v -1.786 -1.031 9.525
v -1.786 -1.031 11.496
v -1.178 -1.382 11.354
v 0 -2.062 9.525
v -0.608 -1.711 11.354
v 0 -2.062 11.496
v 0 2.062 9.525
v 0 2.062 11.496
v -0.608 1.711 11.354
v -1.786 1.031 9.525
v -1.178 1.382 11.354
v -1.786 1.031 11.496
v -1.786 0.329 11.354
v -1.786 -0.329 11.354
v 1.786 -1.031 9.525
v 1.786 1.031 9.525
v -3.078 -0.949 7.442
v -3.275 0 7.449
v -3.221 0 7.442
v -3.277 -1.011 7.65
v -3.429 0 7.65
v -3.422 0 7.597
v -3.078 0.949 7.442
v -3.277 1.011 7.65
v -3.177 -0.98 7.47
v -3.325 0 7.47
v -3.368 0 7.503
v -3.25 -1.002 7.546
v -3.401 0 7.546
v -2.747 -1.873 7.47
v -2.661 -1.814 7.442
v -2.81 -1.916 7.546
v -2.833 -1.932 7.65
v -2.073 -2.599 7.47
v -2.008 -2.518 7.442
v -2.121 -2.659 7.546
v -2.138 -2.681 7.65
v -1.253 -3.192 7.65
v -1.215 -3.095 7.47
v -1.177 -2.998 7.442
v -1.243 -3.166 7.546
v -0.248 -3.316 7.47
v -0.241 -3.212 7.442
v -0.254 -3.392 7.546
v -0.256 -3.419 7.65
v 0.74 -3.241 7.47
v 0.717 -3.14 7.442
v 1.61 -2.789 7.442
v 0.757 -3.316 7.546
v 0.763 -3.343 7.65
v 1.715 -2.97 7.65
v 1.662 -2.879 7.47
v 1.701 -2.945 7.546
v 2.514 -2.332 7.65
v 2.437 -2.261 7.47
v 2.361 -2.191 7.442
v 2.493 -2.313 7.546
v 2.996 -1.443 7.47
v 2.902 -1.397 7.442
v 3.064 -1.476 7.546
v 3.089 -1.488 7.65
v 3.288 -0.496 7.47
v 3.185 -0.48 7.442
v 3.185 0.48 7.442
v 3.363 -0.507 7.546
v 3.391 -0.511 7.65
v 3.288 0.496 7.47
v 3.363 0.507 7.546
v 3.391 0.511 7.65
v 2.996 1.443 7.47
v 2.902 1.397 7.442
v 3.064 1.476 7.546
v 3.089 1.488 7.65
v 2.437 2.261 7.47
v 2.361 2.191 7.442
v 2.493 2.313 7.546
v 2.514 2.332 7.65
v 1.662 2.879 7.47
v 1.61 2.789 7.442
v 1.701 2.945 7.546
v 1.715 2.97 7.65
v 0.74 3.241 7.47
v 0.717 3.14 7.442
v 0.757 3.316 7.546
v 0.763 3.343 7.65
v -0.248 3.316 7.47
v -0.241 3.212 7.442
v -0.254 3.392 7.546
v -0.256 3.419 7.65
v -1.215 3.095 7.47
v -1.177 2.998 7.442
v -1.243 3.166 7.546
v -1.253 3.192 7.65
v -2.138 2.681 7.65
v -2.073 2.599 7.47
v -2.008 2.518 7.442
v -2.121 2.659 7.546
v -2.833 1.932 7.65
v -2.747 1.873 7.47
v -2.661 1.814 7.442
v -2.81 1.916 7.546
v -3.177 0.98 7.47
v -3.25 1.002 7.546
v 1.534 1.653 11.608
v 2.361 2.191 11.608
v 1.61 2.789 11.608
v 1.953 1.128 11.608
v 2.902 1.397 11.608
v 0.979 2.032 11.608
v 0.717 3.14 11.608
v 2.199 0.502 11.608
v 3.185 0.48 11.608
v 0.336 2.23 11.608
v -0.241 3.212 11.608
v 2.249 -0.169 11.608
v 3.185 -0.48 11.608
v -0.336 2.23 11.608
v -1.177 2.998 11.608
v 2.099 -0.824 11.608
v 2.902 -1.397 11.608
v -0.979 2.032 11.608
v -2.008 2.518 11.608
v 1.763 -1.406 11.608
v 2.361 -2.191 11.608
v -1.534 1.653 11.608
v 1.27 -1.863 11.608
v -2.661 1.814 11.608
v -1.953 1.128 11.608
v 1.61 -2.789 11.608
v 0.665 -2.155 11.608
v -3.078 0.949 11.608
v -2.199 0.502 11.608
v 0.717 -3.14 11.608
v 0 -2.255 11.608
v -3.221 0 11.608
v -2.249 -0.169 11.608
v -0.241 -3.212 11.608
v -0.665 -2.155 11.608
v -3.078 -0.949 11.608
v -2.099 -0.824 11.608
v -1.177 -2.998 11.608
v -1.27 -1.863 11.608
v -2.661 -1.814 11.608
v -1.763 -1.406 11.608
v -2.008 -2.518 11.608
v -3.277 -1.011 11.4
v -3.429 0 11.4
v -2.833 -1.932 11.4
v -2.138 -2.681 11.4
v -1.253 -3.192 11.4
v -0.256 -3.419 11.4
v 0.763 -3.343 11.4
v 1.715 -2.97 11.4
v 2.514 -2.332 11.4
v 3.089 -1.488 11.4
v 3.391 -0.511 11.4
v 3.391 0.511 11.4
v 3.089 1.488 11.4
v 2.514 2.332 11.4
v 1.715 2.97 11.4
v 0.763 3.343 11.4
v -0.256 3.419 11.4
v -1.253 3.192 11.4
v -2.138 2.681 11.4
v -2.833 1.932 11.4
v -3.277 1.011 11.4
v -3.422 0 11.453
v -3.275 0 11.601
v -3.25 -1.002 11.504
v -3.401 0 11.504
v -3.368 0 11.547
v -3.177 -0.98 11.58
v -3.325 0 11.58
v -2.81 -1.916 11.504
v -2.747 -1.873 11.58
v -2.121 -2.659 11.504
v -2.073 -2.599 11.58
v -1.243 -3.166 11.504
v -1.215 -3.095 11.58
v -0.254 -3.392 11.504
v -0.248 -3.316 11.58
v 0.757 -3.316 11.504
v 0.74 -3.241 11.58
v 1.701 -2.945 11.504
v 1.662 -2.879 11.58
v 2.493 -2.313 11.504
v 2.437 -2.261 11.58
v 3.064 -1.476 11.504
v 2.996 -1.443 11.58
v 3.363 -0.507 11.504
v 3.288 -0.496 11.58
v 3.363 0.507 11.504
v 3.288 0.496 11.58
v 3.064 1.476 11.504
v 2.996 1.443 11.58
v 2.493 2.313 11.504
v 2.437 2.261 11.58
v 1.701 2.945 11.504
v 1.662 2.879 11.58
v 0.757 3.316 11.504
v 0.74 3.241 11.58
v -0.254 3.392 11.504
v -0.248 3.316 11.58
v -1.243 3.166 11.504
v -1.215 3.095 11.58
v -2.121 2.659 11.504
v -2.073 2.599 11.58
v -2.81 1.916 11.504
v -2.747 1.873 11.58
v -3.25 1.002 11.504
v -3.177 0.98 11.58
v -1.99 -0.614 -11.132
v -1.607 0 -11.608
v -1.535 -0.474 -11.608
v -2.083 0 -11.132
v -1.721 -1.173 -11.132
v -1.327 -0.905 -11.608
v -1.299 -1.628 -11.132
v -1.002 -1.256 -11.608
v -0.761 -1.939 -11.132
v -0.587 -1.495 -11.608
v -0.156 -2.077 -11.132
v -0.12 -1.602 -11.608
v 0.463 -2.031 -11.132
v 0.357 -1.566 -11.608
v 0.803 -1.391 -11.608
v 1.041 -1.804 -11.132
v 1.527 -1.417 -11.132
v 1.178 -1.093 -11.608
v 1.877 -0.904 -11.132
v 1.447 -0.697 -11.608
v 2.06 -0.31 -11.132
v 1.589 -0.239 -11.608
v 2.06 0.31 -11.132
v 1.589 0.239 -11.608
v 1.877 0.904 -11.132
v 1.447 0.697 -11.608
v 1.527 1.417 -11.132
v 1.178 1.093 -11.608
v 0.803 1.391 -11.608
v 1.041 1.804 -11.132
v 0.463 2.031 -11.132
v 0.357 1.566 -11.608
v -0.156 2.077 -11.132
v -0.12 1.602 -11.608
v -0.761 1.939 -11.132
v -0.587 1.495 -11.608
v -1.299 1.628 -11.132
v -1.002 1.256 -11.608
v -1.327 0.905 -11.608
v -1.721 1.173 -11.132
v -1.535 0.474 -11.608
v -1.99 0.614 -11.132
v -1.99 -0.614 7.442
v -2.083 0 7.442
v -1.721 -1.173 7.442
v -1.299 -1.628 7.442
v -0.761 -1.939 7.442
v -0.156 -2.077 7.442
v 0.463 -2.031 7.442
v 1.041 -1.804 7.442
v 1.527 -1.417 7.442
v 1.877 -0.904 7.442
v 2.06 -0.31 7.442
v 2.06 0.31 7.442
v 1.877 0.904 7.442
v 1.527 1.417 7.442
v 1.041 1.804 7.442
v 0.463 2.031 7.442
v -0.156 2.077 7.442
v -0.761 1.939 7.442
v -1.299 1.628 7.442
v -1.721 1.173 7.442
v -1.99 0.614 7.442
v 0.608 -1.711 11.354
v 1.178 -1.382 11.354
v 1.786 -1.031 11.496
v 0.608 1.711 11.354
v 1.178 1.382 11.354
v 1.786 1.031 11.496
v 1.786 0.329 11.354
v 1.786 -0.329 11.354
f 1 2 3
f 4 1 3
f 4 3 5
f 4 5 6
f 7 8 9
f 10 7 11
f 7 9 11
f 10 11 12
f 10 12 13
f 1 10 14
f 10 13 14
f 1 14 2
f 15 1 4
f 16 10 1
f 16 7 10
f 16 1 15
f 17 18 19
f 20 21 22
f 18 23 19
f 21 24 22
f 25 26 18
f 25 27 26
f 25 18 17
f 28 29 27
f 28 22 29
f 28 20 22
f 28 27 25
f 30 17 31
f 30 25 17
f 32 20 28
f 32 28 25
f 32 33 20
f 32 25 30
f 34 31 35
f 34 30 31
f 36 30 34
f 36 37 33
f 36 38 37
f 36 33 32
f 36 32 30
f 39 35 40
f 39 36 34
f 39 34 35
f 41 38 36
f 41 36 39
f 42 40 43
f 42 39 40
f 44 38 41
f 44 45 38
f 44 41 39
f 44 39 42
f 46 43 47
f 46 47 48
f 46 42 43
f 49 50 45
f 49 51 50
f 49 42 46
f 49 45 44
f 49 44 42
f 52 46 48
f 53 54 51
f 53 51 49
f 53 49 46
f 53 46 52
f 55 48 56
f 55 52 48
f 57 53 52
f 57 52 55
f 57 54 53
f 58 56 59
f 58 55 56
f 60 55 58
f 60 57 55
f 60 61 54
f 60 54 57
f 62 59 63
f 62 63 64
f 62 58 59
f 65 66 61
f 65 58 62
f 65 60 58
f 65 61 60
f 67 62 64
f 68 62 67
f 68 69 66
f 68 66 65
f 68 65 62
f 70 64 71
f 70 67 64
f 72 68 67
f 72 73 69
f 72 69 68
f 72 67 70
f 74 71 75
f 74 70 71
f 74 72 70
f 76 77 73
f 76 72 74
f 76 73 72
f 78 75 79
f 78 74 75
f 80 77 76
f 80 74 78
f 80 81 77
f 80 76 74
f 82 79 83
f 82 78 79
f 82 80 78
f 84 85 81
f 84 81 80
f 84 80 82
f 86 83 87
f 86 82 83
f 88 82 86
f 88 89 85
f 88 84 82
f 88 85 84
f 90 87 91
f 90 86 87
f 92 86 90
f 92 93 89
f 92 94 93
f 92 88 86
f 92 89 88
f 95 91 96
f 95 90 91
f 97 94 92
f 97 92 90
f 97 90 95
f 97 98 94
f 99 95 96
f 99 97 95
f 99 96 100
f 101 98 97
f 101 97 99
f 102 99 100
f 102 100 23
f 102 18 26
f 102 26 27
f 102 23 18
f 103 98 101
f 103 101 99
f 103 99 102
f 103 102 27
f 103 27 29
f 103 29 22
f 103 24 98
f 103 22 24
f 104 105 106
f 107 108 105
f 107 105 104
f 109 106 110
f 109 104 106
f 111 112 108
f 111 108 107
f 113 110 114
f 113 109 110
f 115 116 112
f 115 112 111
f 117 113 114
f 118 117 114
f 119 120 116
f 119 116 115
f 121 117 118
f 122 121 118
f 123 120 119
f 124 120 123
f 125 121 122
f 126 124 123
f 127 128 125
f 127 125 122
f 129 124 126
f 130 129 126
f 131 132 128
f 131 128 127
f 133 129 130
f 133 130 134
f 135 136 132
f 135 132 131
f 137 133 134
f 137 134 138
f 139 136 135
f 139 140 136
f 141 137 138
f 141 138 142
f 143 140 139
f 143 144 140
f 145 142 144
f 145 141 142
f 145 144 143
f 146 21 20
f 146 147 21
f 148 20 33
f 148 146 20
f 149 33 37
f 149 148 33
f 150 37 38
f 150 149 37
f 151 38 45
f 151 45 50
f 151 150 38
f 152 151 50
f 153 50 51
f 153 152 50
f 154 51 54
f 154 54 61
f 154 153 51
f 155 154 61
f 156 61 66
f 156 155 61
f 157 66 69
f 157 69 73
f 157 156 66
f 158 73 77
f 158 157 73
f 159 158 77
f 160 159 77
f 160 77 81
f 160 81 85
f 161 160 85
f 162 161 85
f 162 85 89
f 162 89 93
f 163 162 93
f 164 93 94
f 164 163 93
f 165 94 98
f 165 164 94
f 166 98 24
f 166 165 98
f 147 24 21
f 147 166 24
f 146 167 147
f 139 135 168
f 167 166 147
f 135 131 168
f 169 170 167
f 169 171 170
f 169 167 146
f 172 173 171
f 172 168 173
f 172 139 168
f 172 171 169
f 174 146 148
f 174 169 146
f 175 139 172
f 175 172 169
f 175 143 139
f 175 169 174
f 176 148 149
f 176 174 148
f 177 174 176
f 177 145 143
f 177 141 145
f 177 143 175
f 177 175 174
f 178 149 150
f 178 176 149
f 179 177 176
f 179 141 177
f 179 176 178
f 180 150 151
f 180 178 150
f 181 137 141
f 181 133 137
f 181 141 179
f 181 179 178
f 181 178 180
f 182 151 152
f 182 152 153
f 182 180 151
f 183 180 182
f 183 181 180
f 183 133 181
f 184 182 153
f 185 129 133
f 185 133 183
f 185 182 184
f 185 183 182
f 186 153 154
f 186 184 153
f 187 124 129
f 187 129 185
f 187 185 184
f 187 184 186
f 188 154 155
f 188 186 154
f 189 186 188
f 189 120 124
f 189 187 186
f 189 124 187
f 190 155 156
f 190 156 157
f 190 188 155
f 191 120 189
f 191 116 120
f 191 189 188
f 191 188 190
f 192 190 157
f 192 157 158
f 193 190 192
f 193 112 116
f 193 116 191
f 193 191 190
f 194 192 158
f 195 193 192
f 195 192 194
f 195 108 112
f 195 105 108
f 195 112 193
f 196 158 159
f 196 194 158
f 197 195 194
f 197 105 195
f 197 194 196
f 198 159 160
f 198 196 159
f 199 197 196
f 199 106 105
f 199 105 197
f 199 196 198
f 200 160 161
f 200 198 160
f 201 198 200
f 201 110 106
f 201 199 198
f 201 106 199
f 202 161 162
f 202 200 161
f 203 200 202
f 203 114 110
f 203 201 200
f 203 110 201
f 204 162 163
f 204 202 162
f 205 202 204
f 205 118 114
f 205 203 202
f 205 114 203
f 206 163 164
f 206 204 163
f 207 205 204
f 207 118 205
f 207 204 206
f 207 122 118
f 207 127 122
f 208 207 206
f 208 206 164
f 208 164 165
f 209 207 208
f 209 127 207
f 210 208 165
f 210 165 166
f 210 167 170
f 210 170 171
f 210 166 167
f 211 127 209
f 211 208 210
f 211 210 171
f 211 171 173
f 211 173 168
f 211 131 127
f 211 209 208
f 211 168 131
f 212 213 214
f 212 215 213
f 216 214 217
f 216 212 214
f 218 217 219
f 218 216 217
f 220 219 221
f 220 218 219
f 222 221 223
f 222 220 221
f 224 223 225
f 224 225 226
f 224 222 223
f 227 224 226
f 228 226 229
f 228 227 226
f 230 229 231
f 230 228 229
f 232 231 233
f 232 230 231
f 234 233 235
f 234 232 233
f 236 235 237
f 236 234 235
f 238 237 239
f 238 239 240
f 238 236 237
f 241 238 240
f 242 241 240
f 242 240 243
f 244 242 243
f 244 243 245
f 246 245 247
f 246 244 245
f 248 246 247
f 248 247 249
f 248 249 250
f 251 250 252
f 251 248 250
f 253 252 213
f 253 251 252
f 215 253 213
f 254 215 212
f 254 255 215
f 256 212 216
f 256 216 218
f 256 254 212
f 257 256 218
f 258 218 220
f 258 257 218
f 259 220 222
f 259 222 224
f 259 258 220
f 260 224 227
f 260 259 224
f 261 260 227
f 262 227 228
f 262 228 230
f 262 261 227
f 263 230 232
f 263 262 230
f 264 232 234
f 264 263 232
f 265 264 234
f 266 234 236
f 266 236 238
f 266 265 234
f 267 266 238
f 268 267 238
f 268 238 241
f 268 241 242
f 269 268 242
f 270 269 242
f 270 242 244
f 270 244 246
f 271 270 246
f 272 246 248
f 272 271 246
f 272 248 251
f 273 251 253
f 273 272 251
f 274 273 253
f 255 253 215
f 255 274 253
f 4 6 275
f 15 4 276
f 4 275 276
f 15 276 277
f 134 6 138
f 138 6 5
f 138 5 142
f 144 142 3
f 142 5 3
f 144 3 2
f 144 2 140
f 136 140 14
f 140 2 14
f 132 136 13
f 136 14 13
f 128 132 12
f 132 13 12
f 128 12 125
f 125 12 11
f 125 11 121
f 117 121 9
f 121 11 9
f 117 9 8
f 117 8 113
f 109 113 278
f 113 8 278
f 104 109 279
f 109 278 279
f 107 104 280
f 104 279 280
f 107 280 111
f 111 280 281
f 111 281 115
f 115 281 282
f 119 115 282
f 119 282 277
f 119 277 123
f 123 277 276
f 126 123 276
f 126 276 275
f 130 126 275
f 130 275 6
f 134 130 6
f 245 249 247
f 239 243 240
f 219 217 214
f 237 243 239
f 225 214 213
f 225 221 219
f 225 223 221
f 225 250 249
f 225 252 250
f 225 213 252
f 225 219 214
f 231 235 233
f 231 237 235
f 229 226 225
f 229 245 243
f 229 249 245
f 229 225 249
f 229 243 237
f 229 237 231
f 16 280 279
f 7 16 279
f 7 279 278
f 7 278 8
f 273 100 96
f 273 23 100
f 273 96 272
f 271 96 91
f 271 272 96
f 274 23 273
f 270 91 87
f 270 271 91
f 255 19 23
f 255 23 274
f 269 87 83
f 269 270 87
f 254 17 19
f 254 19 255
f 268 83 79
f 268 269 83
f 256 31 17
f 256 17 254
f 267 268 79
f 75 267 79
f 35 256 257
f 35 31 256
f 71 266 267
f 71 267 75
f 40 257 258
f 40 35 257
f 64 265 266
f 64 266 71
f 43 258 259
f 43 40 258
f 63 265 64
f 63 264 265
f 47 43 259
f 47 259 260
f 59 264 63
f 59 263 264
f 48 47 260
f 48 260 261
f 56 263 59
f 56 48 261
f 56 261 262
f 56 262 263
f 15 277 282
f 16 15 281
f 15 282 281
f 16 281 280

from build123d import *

# Parameters (mm, degrees)
CUT_EXTRUDE1_START = 11.6078
CUT_EXTRUDE1_DEPTH = 2.0828


with BuildPart() as part:
    # Sketch2 → Revolve1 (revolve)
    with BuildSketch(Plane(origin=(0, 0, 0), x_dir=(0, 0, -1), z_dir=(1, 0, 0)), mode=Mode.PRIVATE) as revolve1_sk:
        with BuildLine():
            Line((11.6078, 0), (11.6078, 1.60655))
            Line((11.6078, 1.60655), (11.13155, 2.0828))
            Line((11.13155, 2.0828), (-7.4422, 2.0828))
            Line((-7.4422, 2.0828), (-7.4422, 3.22072))
            ThreePointArc((-7.4422, 3.22072), (-7.5032038, 3.3679962), (-7.65048, 3.429))
            Line((-7.65048, 3.429), (-11.39952, 3.429))
            ThreePointArc((-11.39952, 3.429), (-11.5467962, 3.3679962), (-11.6078, 3.22072))
            Line((-11.6078, 3.22072), (-11.6078, 0))
            Line((-11.6078, 0), (11.6078, 0))
        make_face()
    revolve(revolve1_sk.sketch.rotate(Axis((0, 0, -11.6078), (0, 0, 1)), 90), axis=Axis((0, 0, -11.6078), (0, 0, 1)))

    # Sketch3 → Cut-Extrude1 (cut)
    with BuildSketch(Plane.XY.offset(CUT_EXTRUDE1_START)):
        Polygon((-1.7859375, 1.031111496), (-1.7859375, -1.031111496), (0, -2.062222993), (1.7859375, -1.031111496), (1.7859375, 1.031111496), (0, 2.062222993), align=None)
    extrude(amount=-CUT_EXTRUDE1_DEPTH, mode=Mode.SUBTRACT)

    # Cut-Extrude2 cone 1 section (through the dimple's axis) → Cut-Extrude2 (revolve, cut)
    with BuildSketch(Plane(origin=(0, 0, 11.6078), x_dir=(0, -1, 0), z_dir=(1, 0, 0))):
        Polygon((0, 0), (2.255305827, 0), (0, 1.302101426), align=None)
    revolve(axis=Axis((0, 0, 11.6078), (0, 0, -1)), mode=Mode.SUBTRACT)


solid = part.part
